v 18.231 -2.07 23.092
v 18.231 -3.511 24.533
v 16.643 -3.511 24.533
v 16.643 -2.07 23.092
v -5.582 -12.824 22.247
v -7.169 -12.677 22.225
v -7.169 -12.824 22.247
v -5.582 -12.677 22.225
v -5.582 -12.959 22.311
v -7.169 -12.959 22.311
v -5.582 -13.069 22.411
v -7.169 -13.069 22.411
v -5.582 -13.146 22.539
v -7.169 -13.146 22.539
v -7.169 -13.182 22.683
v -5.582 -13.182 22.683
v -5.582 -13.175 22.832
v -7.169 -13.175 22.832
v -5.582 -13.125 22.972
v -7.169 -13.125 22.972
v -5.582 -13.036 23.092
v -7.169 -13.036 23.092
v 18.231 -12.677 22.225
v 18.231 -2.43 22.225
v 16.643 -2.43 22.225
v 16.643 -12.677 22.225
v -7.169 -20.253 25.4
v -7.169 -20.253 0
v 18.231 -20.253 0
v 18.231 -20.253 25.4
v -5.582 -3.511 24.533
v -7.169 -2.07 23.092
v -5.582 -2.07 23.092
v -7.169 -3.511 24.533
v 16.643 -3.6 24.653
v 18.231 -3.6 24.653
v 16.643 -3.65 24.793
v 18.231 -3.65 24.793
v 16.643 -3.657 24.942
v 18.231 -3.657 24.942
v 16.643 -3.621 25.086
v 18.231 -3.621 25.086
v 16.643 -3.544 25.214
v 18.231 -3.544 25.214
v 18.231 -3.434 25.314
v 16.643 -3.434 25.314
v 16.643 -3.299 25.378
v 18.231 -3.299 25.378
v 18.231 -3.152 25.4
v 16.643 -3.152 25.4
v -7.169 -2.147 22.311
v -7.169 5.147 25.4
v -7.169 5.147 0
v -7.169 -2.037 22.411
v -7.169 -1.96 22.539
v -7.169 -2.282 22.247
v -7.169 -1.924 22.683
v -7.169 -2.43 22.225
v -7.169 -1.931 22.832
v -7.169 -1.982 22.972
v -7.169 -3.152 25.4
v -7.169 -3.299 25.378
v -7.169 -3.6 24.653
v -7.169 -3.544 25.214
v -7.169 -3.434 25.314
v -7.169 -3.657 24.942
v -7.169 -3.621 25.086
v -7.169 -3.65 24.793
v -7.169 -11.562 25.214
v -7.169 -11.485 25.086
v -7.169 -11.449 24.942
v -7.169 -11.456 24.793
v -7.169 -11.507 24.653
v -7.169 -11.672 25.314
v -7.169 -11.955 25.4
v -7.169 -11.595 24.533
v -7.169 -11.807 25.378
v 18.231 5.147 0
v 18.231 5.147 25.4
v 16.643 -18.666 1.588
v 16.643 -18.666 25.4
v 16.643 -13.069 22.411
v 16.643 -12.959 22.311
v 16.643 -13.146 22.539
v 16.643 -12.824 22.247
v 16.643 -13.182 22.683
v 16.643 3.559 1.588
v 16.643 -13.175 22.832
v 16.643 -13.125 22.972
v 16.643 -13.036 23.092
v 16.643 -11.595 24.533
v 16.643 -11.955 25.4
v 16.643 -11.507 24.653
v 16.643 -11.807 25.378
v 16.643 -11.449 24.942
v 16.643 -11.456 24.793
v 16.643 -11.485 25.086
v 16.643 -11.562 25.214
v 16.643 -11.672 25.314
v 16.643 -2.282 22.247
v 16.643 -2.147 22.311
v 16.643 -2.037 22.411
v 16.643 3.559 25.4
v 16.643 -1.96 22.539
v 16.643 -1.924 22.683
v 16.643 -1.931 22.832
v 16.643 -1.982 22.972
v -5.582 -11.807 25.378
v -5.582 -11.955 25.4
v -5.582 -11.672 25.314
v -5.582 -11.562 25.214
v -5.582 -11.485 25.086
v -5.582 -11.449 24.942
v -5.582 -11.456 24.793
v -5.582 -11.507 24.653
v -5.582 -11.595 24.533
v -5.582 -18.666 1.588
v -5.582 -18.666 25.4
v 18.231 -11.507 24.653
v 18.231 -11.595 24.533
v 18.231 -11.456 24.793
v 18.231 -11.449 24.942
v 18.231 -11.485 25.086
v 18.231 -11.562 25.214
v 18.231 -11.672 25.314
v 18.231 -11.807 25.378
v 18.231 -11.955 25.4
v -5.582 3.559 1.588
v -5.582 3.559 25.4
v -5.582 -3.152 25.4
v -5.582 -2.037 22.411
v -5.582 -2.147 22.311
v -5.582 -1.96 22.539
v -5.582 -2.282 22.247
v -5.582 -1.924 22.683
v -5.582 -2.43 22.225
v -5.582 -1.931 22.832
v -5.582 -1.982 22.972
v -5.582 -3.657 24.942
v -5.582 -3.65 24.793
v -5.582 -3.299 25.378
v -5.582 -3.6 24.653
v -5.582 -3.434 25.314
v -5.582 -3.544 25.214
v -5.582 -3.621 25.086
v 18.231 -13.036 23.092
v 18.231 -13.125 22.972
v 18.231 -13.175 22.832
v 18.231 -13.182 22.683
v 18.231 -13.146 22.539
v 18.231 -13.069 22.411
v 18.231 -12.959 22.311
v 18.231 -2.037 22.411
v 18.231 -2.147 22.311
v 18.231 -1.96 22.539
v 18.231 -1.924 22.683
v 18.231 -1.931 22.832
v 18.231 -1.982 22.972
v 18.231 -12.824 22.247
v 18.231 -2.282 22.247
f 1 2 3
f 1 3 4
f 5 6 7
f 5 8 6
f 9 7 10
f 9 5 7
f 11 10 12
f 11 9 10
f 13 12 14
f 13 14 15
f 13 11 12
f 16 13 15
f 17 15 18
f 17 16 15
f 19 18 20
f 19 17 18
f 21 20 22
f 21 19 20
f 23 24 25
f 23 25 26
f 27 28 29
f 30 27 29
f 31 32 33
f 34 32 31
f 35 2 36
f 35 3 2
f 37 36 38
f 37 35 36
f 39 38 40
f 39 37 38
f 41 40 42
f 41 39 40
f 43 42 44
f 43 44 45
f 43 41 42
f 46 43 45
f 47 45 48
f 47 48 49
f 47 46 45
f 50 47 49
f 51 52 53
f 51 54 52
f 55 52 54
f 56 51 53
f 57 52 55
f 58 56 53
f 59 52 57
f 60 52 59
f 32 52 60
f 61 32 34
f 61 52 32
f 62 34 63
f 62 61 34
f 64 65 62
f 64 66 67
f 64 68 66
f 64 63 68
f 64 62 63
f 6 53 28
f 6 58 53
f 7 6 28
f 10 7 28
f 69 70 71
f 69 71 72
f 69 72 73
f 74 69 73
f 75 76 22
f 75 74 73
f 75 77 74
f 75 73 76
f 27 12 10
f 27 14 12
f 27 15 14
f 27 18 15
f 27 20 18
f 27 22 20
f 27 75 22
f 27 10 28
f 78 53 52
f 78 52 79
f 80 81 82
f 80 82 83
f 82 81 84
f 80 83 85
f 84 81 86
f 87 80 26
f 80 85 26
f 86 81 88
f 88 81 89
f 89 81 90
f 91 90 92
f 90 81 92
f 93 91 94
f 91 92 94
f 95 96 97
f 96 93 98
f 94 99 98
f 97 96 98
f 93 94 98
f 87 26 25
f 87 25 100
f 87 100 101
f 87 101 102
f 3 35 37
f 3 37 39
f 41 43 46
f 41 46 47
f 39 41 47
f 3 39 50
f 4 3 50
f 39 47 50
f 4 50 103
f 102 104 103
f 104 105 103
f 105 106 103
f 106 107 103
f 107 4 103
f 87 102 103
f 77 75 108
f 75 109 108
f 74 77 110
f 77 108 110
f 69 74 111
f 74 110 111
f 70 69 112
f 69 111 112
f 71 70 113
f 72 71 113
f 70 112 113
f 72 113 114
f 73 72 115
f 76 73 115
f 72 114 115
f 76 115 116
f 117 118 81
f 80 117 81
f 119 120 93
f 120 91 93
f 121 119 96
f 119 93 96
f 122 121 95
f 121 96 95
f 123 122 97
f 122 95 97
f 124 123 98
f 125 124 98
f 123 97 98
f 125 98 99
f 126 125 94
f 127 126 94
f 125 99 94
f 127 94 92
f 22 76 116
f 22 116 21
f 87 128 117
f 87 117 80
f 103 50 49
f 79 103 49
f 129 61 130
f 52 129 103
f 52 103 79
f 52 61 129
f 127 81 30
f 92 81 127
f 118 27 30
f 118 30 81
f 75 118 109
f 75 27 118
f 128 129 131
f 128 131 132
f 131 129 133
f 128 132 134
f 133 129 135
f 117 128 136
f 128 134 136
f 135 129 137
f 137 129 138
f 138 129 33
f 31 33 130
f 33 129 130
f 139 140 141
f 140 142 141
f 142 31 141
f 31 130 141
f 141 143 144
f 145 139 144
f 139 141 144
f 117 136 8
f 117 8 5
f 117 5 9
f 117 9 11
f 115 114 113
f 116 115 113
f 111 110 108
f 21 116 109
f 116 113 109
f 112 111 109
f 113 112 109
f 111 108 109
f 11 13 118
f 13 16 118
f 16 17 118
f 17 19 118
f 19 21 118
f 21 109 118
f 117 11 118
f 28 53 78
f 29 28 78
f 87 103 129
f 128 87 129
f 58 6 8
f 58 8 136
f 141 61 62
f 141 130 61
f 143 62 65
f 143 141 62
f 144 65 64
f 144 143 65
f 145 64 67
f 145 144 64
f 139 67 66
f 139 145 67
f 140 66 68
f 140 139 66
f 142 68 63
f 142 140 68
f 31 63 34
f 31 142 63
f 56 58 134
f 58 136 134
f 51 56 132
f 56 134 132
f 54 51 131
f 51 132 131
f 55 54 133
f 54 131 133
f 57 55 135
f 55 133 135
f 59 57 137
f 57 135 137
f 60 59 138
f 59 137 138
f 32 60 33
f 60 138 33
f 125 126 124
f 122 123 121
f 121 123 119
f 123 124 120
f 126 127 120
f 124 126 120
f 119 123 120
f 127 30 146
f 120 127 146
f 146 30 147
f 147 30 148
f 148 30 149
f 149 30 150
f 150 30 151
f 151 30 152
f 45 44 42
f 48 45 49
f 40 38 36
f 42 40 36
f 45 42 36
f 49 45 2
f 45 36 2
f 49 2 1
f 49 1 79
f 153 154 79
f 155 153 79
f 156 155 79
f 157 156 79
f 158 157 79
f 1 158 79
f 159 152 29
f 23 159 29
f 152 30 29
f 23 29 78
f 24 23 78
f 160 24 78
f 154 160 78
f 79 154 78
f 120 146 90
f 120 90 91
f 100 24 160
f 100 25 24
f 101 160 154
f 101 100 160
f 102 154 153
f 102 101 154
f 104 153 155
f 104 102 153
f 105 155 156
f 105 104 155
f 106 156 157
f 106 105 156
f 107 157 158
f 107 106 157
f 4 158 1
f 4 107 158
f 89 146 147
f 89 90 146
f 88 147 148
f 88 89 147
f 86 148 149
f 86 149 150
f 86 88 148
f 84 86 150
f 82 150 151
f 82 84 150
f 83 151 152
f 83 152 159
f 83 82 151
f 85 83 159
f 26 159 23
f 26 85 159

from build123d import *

# Parameters (mm, degrees)
F0_W      = 25.4
F0_H      = 25.4
F1_DEPTH  = 1.5875
F2_W      = 25.4
F2_H      = 25.4
F3_DEPTH  = 1.5875
F4_W      = 25.4
F4_H      = 25.4
F5_DEPTH  = 1.5875
F7_DEPTH  = 1.5875
F9_DEPTH  = 1.5875
F10_DEPTH = 1.5875
F11_R     = 0.508
F12_R     = 0.508
F13_R     = 0.508
F14_R     = 0.508
F15_R     = 0.508
F16_R     = 0.508
F17_R     = 0.508


with BuildPart() as f1:
    # F0 (on Top) → F1 (new body)
    with BuildSketch(Plane.XY):
        with Locations((5.530645, -7.55323)):
            Rectangle(F0_W, F0_H)
    extrude(amount=F1_DEPTH)

    # F2 (on face) → F3 (join)
    with BuildSketch(Plane.XZ.offset(20.25323)):
        with Locations((5.530645, 12.7)):
            Rectangle(F2_W, F2_H)
    extrude(amount=-F3_DEPTH)

    # F4 (on face) → F5 (join)
    with BuildSketch(Plane(origin=(0, 5.14677, 0), x_dir=(-1, 0, 0), z_dir=(0, 1, 0))):
        with Locations((-5.530645, 12.7)):
            Rectangle(F4_W, F4_H)
    extrude(amount=-F5_DEPTH)

    # F6 (on face) → F7 (join)
    with BuildSketch(Plane.YZ.offset(18.230645)):
        Polygon((-20.25323, 25.4), (-20.25323, 0), (5.14677, 0), (5.14677, 25.4), (-4.37823, 25.4), (-1.20323, 22.225), (-13.90323, 22.225), (-10.72823, 25.4), align=None)
    extrude(amount=-F7_DEPTH)

    # F6 (on face) → F9 (join)
    with BuildSketch(Plane.YZ.offset(18.230645)):
        Polygon((-20.25323, 25.4), (-20.25323, 0), (5.14677, 0), (5.14677, 25.4), (-4.37823, 25.4), (-1.20323, 22.225), (-13.90323, 22.225), (-10.72823, 25.4), align=None)
    extrude(amount=-F9_DEPTH)

    # F8 (on face) → F10 (join)
    with BuildSketch(Plane(origin=(-7.169355, 0, 0), x_dir=(0, -1, 0), z_dir=(-1, 0, 0))):
        Polygon((4.37823, 25.4), (-3.55927, 25.4), (-3.55927, 1.5875), (18.66573, 1.5875), (18.66573, 25.4), (10.72823, 25.4), (13.90323, 22.225), (1.20323, 22.225), align=None)
    extrude(amount=-F10_DEPTH)

    # F11
    f11_edges = [f1.edges().sort_by_distance(p)[0] for p in [
        (-6.375605, -1.20323, 22.225),
    ]]
    fillet(f11_edges, radius=F11_R)

    # F12
    f12_edges = [f1.edges().sort_by_distance(p)[0] for p in [
        (-6.375605, -13.90323, 22.225),
    ]]
    fillet(f12_edges, radius=F12_R)

    # F13
    f13_edges = [f1.edges().sort_by_distance(p)[0] for p in [
        (17.436895, -13.90323, 22.225),
    ]]
    fillet(f13_edges, radius=F13_R)

    # F14
    f14_edges = [f1.edges().sort_by_distance(p)[0] for p in [
        (17.436895, -1.20323, 22.225),
    ]]
    fillet(f14_edges, radius=F14_R)

    # F15
    f15_edges = [f1.edges().sort_by_distance(p)[0] for p in [
        (17.436895, -4.37823, 25.4),
    ]]
    fillet(f15_edges, radius=F15_R)

    # F16
    f16_edges = [f1.edges().sort_by_distance(p)[0] for p in [
        (17.436895, -10.72823, 25.4),
    ]]
    fillet(f16_edges, radius=F16_R)

    # F17
    f17_edges = [f1.edges().sort_by_distance(p)[0] for p in [
        (-6.375605, -4.37823, 25.4),
        (-6.375605, -10.72823, 25.4),
    ]]
    fillet(f17_edges, radius=F17_R)


solid = f1.part
